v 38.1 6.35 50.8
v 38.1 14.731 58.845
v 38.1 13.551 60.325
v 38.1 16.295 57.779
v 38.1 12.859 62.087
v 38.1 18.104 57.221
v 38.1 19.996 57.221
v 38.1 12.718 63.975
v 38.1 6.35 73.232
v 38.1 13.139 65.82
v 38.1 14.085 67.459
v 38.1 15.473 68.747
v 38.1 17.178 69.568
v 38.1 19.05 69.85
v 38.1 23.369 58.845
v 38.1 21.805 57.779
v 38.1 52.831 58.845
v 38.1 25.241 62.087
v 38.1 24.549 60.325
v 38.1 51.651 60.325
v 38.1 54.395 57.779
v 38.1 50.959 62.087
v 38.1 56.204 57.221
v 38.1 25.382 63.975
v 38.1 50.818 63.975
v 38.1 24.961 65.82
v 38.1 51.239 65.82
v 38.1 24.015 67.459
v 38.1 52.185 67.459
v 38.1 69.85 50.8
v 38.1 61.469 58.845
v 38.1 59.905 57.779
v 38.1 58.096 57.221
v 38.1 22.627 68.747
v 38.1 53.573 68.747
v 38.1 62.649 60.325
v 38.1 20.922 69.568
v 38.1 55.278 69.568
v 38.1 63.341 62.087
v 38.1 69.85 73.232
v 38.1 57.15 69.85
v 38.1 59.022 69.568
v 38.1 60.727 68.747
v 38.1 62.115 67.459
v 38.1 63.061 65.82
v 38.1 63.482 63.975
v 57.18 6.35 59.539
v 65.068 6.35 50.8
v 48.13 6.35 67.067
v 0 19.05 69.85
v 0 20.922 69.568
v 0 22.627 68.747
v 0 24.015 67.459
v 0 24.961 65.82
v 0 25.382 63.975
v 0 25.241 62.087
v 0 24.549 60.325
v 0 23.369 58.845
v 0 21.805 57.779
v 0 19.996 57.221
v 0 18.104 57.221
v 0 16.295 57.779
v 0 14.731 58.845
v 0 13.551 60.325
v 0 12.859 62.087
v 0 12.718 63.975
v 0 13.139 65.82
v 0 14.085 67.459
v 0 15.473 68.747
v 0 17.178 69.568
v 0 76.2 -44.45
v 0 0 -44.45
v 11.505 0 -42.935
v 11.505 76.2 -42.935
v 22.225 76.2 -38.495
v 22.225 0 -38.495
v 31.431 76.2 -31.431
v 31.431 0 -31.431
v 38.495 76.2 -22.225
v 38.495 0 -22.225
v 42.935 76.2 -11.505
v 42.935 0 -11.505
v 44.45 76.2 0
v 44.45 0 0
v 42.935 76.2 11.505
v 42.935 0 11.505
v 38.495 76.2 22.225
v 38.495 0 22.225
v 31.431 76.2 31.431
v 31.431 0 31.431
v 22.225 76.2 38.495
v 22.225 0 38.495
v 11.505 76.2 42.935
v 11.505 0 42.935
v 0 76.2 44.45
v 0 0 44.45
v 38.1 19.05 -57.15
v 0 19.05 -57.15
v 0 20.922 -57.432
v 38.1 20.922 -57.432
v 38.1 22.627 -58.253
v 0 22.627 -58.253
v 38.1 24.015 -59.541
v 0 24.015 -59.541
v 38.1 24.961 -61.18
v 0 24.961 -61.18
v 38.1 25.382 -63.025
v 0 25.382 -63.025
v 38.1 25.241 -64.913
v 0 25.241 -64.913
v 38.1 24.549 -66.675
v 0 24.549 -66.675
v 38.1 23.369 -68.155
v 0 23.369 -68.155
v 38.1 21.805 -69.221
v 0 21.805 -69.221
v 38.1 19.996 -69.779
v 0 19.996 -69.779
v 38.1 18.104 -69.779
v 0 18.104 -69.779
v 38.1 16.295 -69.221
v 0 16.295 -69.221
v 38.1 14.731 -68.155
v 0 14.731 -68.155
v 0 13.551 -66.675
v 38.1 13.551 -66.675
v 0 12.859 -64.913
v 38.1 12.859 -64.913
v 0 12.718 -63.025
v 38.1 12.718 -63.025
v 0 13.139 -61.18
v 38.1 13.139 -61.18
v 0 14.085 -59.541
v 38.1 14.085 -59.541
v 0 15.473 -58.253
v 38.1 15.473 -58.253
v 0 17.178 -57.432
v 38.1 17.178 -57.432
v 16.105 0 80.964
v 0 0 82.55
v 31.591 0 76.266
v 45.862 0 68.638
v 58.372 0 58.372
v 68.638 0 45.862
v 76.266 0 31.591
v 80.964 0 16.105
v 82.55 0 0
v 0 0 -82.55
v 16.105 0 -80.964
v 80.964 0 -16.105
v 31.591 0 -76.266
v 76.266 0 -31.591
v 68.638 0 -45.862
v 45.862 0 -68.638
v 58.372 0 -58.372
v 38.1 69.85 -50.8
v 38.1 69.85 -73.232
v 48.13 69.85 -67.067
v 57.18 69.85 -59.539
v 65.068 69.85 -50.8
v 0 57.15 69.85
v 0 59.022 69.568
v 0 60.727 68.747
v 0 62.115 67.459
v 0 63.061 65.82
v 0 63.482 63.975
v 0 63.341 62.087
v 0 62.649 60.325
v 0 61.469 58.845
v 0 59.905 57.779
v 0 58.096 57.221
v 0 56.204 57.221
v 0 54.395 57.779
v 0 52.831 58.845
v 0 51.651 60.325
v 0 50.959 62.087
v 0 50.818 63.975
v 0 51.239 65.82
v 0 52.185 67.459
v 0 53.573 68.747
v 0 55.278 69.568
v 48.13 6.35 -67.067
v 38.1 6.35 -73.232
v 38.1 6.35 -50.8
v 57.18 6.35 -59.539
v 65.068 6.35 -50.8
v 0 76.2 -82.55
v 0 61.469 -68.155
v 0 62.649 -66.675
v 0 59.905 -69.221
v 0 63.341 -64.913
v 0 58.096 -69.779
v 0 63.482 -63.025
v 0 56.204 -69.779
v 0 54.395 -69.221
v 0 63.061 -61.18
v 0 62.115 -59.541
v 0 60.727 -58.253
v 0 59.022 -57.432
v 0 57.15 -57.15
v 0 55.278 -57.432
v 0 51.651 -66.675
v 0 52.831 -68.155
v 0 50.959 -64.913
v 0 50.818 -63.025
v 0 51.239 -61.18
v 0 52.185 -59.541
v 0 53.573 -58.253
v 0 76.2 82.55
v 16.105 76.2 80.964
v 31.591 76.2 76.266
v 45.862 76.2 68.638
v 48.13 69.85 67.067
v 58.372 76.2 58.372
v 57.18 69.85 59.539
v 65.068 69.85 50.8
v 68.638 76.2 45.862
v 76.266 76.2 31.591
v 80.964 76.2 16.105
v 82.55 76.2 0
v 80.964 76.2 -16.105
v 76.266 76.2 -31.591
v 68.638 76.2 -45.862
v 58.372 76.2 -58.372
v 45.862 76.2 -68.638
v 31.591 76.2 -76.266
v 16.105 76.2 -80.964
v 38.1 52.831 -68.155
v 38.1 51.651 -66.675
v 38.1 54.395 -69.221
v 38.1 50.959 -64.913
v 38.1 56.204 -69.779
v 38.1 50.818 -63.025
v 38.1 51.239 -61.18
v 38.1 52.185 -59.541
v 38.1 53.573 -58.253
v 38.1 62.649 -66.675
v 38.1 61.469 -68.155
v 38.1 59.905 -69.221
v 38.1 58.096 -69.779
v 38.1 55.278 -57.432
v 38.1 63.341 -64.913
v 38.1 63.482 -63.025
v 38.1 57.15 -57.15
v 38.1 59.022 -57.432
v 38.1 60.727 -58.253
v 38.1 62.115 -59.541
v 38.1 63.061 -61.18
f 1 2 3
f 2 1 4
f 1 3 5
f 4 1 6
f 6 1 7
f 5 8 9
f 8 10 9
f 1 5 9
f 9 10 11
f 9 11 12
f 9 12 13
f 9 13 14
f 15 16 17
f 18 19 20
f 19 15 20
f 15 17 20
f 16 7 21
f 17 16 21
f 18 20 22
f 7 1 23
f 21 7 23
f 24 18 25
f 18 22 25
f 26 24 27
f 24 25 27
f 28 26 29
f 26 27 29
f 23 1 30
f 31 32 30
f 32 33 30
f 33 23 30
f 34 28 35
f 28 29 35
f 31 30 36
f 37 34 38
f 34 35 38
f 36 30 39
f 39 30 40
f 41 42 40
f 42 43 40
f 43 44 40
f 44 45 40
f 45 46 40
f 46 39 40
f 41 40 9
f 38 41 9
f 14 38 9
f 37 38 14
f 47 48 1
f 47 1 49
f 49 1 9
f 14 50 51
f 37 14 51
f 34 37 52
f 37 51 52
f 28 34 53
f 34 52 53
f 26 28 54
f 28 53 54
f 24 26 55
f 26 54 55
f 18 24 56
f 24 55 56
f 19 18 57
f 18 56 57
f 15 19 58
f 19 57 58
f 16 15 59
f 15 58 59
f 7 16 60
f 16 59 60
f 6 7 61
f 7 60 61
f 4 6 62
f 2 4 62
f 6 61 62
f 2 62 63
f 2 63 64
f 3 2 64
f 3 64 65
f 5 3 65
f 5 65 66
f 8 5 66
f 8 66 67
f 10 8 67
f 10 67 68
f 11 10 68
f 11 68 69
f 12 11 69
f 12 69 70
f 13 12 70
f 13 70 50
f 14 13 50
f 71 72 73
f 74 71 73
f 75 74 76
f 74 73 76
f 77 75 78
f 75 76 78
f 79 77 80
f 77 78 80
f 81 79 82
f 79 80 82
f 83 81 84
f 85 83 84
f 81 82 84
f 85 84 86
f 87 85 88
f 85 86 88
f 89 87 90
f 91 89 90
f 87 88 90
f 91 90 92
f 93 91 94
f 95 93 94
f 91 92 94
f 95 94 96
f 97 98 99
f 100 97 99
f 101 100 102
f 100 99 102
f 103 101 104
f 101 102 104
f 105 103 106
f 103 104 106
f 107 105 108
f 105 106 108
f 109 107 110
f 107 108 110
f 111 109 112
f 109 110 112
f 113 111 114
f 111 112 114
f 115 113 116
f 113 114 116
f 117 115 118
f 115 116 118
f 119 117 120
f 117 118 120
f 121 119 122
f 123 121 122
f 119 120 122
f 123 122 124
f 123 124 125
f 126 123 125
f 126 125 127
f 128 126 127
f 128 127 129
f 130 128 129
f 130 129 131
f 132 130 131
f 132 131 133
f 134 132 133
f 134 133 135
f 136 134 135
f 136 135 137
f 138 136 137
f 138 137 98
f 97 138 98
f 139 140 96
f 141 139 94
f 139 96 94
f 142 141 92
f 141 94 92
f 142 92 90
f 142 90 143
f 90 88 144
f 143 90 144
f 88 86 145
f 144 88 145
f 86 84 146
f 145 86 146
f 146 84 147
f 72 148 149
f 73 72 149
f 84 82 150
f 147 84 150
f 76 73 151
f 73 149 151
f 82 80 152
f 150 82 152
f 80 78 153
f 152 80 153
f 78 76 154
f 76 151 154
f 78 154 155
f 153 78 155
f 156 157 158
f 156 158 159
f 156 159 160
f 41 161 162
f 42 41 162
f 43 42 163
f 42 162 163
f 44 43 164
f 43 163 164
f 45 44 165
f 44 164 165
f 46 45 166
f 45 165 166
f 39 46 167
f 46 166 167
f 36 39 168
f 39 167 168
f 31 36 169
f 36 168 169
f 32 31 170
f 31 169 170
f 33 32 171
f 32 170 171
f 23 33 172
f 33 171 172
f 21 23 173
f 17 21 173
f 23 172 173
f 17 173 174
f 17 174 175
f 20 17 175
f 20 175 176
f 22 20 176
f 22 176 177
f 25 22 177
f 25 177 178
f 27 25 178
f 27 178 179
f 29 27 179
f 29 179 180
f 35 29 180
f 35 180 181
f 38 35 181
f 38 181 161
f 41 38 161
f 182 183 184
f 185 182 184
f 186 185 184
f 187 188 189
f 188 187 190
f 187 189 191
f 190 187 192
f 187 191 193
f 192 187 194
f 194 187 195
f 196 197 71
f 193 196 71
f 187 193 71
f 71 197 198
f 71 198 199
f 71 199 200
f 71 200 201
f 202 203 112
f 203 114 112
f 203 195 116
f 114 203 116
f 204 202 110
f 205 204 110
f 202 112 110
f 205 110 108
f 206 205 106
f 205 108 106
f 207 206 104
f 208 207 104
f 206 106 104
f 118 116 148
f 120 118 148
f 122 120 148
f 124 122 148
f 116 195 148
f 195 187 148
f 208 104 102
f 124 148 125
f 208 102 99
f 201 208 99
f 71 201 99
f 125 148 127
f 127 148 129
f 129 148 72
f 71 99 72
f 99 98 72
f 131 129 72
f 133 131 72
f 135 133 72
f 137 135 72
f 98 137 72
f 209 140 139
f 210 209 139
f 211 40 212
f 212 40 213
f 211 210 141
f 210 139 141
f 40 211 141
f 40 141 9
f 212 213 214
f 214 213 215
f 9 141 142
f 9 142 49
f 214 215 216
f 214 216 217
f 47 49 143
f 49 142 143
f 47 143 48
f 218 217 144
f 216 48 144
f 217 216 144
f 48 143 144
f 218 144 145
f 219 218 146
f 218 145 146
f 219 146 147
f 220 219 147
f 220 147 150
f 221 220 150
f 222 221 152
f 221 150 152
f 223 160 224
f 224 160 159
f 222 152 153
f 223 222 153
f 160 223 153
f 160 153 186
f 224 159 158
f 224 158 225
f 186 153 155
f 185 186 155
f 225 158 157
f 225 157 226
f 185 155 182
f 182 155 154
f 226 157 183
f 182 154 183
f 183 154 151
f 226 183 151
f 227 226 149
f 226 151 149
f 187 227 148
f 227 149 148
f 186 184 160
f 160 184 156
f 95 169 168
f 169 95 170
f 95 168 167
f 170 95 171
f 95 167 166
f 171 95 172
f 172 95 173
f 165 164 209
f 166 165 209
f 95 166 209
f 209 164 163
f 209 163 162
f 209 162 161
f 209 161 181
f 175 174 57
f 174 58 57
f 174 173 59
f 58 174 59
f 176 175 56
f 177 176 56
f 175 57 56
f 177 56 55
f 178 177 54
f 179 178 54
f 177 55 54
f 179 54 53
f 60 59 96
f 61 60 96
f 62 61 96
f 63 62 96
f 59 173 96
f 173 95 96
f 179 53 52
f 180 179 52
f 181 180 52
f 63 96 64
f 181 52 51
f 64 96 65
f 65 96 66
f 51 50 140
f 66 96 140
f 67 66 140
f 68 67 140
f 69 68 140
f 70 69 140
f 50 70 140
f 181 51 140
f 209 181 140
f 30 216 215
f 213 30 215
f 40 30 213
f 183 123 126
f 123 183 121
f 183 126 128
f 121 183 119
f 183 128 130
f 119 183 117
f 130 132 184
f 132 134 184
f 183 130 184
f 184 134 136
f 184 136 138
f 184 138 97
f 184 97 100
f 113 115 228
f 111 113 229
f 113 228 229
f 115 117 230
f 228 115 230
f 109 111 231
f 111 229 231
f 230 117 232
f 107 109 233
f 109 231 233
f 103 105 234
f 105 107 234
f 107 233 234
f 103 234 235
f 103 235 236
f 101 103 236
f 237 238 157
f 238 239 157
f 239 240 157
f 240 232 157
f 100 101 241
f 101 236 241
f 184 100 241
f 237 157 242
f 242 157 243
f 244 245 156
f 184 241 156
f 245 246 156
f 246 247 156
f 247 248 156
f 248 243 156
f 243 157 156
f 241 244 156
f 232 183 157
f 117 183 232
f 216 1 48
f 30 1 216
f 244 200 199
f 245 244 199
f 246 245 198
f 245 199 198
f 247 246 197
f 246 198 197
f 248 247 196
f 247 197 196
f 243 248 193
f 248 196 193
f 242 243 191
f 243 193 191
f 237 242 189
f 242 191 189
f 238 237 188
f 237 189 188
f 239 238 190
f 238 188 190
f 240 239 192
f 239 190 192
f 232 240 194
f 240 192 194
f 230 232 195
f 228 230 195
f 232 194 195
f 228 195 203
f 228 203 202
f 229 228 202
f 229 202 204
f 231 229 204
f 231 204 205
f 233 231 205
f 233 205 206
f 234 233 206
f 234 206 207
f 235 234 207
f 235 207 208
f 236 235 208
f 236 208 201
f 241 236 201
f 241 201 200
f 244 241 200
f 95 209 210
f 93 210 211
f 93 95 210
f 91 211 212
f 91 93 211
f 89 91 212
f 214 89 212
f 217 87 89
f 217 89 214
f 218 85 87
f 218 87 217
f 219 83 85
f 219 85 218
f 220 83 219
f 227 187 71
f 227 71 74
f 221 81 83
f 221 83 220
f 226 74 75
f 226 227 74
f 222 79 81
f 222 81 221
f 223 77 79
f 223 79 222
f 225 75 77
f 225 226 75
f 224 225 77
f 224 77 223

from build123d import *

# Parameters (mm, degrees)
BOSS_EXTRUDE1_DEPTH = 76.2
SKETCH2_R           = 6.35
CUT_EXTRUDE1_DEPTH  = 83.55
SKETCH3_W           = 25.4
SKETCH3_H           = 63.5
CUT_EXTRUDE2_DEPTH  = 45.4500001


with BuildPart() as part:
    # Sketch1 → Boss-Extrude1 (new body)
    with BuildSketch(Plane(origin=(0, 0, 0), x_dir=(1, 0, 0), z_dir=(0, 1, 0))):
        with BuildLine():
            Line((0, 82.55), (0, 44.45))
            ThreePointArc((0, 44.45), (44.45, 0), (0, -44.45))
            Line((0, -44.45), (0, -82.55))
            ThreePointArc((0, -82.55), (82.55, 0), (0, 82.55))
        make_face()
    extrude(amount=BOSS_EXTRUDE1_DEPTH)

    # Sketch2 → Cut-Extrude1 (cut, through all)
    with BuildSketch(Plane.ZY):
        with Locations((-63.5, 57.15)):
            Circle(SKETCH2_R)
        with Locations((-63.5, 19.05)):
            Circle(SKETCH2_R)
        with Locations((63.5, 19.05)):
            Circle(SKETCH2_R)
        with Locations((63.5, 57.15)):
            Circle(SKETCH2_R)
    extrude(amount=-CUT_EXTRUDE1_DEPTH, mode=Mode.SUBTRACT)

    # Sketch3 → Cut-Extrude2 (cut, through all)
    with BuildSketch(Plane.ZY.offset(-38.1)):
        with Locations((63.5, 38.1)):
            Rectangle(SKETCH3_W, SKETCH3_H)
        with Locations((-63.5, 38.1)):
            Rectangle(SKETCH3_W, SKETCH3_H)
    extrude(amount=-CUT_EXTRUDE2_DEPTH, mode=Mode.SUBTRACT)


solid = part.part
